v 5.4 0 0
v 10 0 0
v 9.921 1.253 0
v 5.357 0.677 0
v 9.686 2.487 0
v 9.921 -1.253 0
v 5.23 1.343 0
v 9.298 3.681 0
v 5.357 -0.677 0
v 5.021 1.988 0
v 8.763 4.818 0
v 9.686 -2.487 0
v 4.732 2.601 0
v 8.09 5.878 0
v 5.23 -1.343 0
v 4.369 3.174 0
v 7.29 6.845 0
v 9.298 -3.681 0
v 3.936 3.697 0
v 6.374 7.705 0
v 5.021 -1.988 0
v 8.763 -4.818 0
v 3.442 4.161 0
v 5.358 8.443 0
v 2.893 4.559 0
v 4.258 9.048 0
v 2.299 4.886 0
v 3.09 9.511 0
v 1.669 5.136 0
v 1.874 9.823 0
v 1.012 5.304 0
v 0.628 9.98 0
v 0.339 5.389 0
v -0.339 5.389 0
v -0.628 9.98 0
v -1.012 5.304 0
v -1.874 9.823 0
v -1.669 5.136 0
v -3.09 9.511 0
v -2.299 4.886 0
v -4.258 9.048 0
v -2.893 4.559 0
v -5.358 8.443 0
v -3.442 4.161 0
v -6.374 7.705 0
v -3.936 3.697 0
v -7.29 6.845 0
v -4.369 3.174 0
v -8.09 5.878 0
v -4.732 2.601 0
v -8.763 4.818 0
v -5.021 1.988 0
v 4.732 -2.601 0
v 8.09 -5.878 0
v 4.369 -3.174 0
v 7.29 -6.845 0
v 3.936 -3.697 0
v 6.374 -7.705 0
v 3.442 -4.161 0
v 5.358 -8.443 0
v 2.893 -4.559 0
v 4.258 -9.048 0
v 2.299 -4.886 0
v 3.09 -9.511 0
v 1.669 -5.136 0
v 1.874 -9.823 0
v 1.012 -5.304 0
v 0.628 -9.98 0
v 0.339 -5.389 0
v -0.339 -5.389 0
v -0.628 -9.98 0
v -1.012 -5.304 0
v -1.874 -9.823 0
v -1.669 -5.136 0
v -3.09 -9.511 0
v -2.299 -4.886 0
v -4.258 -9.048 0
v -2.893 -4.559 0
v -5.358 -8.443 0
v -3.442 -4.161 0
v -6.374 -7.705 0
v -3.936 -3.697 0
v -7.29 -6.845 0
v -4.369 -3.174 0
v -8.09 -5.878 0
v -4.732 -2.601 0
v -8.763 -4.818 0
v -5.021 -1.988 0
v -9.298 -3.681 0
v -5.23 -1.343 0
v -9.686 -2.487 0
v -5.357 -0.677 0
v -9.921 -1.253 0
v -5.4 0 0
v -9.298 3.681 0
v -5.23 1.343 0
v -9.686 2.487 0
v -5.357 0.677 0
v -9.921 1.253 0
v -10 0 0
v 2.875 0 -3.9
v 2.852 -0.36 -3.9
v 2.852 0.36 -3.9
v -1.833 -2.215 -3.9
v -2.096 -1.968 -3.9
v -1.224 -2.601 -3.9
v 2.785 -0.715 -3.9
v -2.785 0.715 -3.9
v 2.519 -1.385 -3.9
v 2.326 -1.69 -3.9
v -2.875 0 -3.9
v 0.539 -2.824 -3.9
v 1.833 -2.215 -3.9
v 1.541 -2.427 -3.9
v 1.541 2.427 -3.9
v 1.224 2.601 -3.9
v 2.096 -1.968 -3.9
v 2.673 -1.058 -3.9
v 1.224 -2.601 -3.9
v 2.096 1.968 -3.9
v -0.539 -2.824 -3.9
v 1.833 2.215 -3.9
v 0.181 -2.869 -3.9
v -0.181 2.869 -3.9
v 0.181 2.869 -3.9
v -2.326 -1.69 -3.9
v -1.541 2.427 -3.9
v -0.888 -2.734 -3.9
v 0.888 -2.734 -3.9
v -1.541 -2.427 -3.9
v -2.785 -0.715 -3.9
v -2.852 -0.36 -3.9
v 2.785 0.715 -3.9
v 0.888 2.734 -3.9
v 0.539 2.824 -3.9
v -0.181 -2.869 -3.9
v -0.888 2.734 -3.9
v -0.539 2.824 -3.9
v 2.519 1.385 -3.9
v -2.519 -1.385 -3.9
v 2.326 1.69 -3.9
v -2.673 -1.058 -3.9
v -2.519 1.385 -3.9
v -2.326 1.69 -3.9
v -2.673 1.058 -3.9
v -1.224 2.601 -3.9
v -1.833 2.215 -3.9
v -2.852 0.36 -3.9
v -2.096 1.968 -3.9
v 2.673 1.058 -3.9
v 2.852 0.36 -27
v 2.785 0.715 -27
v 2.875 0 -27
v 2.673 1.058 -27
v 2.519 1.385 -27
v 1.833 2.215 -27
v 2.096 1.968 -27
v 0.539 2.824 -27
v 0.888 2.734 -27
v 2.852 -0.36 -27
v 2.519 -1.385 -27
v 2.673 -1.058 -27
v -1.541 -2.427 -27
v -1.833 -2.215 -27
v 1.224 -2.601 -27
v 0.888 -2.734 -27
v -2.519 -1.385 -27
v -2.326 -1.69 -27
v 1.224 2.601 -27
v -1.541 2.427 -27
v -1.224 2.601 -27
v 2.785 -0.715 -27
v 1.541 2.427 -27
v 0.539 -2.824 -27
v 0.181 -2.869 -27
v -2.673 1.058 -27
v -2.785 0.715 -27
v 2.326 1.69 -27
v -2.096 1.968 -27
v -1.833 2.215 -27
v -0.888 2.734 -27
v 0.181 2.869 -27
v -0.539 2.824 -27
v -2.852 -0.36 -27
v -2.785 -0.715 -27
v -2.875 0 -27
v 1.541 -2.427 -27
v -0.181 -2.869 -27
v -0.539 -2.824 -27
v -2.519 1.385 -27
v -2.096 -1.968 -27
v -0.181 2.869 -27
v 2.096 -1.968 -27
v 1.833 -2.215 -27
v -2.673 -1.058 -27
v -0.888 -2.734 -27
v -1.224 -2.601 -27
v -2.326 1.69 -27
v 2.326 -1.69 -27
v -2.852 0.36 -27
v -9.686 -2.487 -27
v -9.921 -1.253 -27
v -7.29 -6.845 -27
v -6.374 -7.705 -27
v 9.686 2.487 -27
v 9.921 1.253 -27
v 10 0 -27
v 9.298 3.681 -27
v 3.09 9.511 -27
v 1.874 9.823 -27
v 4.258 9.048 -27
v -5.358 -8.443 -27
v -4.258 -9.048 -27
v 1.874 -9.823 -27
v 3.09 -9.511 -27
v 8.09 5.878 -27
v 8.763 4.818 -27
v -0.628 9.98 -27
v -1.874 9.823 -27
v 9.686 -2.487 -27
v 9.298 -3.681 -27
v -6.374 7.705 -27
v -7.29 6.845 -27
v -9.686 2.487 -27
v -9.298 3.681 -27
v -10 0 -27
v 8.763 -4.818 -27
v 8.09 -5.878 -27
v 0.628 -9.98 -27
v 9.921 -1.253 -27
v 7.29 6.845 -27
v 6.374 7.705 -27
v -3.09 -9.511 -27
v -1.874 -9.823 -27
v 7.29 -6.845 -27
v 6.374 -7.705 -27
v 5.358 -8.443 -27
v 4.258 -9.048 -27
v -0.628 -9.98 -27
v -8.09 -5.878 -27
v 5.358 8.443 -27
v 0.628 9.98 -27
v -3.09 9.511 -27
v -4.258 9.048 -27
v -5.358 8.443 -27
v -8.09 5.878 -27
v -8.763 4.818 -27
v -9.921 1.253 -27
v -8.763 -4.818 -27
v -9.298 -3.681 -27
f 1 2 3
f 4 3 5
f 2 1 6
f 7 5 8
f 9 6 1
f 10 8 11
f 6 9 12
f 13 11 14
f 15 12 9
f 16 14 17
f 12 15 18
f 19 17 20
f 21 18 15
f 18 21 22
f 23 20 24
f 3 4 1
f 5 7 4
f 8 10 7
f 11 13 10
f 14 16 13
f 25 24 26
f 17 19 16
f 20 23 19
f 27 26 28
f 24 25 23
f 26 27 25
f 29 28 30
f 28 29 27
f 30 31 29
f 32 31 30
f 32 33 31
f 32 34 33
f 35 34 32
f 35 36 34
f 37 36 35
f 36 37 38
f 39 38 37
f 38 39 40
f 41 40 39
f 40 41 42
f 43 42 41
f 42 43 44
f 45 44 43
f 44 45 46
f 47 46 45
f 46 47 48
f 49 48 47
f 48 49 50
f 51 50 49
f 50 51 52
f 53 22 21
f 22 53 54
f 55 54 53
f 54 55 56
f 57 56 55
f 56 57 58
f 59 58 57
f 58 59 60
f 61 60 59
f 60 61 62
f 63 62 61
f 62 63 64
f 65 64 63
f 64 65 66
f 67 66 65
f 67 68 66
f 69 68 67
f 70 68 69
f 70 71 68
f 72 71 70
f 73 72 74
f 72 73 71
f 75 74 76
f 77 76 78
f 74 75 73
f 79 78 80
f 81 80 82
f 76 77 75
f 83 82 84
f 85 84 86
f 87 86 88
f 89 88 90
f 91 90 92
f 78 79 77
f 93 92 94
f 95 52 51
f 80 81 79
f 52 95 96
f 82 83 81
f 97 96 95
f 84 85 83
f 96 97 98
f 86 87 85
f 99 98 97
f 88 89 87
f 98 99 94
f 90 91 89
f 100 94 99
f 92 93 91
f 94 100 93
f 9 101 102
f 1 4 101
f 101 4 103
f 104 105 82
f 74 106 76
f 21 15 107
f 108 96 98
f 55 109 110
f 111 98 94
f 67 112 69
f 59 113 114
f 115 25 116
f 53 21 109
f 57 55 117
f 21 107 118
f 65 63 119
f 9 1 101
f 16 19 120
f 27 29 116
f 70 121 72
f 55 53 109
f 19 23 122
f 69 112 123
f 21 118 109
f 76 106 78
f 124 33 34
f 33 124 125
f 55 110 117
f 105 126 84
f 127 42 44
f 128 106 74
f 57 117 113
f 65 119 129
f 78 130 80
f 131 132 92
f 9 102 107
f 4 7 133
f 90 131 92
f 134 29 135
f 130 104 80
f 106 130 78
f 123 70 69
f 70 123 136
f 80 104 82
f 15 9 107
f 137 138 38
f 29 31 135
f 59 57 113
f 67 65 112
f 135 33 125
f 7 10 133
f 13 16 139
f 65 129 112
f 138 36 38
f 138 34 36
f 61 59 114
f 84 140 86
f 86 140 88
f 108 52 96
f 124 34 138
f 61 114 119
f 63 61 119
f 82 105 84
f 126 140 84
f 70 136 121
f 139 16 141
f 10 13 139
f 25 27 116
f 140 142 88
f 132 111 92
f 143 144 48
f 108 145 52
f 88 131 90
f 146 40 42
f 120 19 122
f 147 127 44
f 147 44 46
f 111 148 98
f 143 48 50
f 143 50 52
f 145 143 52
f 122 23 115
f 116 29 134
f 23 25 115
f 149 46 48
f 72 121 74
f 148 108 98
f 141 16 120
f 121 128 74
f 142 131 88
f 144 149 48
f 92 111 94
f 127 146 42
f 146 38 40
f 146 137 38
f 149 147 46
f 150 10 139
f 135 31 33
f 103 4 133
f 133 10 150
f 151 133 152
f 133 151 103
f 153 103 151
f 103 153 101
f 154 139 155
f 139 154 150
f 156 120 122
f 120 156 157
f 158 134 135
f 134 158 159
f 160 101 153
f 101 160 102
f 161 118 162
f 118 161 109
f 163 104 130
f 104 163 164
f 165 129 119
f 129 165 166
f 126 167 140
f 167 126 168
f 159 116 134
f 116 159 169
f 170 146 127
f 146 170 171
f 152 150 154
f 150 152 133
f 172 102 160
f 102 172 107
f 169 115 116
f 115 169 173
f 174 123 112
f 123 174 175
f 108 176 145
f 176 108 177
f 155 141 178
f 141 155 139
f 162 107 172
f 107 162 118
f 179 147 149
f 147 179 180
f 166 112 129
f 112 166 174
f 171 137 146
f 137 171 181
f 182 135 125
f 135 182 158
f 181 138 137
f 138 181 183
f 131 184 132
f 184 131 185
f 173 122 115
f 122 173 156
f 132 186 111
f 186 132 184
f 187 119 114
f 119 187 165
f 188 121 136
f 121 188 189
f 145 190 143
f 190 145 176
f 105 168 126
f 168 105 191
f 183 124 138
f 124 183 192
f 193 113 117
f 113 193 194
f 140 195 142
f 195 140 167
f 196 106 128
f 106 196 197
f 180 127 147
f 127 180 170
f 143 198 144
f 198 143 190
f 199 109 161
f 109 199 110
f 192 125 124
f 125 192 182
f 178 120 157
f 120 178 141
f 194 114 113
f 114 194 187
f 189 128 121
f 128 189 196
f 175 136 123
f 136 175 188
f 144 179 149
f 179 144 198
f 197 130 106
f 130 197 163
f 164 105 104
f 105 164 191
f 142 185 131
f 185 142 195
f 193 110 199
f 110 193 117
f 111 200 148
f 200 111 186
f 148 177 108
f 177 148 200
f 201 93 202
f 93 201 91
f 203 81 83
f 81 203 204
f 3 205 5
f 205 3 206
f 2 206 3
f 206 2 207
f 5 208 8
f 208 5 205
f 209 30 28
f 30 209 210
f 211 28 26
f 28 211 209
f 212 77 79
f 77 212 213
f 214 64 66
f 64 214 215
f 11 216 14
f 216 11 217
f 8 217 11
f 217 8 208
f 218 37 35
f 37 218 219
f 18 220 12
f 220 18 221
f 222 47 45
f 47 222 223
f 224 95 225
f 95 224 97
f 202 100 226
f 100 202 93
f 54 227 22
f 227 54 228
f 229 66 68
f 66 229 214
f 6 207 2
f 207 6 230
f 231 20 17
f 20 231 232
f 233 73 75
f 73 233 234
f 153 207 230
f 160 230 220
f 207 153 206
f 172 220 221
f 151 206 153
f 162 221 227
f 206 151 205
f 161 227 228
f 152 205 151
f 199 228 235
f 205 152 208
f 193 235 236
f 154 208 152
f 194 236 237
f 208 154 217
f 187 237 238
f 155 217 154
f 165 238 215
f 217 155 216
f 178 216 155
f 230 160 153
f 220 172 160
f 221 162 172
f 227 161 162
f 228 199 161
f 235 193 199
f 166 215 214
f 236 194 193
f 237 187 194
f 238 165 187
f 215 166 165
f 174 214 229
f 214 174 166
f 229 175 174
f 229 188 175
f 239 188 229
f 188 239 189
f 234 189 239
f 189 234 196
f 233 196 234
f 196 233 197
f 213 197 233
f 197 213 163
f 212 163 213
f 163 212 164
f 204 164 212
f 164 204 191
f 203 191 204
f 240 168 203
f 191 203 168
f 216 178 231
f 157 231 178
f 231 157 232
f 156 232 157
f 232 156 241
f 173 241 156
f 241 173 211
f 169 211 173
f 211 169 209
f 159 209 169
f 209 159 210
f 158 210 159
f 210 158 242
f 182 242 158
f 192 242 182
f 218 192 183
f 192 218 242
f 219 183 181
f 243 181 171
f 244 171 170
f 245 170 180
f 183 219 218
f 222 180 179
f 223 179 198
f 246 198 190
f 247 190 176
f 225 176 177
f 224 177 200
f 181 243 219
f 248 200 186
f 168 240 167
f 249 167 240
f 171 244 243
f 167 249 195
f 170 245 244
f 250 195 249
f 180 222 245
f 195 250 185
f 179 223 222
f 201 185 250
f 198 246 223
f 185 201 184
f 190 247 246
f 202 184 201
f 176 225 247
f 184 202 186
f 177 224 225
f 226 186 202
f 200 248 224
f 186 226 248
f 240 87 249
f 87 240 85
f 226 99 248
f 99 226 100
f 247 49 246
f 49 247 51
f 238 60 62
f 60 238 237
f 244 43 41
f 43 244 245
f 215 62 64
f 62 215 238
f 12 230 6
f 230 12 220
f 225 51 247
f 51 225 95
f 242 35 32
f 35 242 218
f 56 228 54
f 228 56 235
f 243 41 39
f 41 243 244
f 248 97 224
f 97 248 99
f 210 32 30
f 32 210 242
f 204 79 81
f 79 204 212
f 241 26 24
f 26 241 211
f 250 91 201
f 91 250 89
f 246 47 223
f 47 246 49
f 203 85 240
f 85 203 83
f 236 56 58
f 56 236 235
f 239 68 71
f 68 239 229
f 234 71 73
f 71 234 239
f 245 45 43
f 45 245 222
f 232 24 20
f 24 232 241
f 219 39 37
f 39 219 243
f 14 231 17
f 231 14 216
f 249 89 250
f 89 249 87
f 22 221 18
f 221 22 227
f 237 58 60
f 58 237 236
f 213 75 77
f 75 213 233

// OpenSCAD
$fn = 50;

difference() {
	union() {
		translate(v = [0, 0, -27.0]) {
			cylinder(h = 27, r = 10.0);
		}
	}
	union() {
		translate(v = [0, 0, 0]) {
			rotate(a = [0, 0, 0]) {
				difference() {
					union() {
						translate(v = [0, 0, -30.0]) {
							cylinder(h = 30, r = 2.6);
						}
						translate(v = [0, 0, -3.9]) {
							cylinder(h = 3.9, r1 = 2.875, r2 = 5.4);
						}
						translate(v = [0, 0, -30.0]) {
							cylinder(h = 30, r = 2.875);
						}
						translate(v = [0, 0, -30.0]) {
							cylinder(h = 30, r = 2.6);
						}
					}
					union();
				}
			}
		}
	}
}
